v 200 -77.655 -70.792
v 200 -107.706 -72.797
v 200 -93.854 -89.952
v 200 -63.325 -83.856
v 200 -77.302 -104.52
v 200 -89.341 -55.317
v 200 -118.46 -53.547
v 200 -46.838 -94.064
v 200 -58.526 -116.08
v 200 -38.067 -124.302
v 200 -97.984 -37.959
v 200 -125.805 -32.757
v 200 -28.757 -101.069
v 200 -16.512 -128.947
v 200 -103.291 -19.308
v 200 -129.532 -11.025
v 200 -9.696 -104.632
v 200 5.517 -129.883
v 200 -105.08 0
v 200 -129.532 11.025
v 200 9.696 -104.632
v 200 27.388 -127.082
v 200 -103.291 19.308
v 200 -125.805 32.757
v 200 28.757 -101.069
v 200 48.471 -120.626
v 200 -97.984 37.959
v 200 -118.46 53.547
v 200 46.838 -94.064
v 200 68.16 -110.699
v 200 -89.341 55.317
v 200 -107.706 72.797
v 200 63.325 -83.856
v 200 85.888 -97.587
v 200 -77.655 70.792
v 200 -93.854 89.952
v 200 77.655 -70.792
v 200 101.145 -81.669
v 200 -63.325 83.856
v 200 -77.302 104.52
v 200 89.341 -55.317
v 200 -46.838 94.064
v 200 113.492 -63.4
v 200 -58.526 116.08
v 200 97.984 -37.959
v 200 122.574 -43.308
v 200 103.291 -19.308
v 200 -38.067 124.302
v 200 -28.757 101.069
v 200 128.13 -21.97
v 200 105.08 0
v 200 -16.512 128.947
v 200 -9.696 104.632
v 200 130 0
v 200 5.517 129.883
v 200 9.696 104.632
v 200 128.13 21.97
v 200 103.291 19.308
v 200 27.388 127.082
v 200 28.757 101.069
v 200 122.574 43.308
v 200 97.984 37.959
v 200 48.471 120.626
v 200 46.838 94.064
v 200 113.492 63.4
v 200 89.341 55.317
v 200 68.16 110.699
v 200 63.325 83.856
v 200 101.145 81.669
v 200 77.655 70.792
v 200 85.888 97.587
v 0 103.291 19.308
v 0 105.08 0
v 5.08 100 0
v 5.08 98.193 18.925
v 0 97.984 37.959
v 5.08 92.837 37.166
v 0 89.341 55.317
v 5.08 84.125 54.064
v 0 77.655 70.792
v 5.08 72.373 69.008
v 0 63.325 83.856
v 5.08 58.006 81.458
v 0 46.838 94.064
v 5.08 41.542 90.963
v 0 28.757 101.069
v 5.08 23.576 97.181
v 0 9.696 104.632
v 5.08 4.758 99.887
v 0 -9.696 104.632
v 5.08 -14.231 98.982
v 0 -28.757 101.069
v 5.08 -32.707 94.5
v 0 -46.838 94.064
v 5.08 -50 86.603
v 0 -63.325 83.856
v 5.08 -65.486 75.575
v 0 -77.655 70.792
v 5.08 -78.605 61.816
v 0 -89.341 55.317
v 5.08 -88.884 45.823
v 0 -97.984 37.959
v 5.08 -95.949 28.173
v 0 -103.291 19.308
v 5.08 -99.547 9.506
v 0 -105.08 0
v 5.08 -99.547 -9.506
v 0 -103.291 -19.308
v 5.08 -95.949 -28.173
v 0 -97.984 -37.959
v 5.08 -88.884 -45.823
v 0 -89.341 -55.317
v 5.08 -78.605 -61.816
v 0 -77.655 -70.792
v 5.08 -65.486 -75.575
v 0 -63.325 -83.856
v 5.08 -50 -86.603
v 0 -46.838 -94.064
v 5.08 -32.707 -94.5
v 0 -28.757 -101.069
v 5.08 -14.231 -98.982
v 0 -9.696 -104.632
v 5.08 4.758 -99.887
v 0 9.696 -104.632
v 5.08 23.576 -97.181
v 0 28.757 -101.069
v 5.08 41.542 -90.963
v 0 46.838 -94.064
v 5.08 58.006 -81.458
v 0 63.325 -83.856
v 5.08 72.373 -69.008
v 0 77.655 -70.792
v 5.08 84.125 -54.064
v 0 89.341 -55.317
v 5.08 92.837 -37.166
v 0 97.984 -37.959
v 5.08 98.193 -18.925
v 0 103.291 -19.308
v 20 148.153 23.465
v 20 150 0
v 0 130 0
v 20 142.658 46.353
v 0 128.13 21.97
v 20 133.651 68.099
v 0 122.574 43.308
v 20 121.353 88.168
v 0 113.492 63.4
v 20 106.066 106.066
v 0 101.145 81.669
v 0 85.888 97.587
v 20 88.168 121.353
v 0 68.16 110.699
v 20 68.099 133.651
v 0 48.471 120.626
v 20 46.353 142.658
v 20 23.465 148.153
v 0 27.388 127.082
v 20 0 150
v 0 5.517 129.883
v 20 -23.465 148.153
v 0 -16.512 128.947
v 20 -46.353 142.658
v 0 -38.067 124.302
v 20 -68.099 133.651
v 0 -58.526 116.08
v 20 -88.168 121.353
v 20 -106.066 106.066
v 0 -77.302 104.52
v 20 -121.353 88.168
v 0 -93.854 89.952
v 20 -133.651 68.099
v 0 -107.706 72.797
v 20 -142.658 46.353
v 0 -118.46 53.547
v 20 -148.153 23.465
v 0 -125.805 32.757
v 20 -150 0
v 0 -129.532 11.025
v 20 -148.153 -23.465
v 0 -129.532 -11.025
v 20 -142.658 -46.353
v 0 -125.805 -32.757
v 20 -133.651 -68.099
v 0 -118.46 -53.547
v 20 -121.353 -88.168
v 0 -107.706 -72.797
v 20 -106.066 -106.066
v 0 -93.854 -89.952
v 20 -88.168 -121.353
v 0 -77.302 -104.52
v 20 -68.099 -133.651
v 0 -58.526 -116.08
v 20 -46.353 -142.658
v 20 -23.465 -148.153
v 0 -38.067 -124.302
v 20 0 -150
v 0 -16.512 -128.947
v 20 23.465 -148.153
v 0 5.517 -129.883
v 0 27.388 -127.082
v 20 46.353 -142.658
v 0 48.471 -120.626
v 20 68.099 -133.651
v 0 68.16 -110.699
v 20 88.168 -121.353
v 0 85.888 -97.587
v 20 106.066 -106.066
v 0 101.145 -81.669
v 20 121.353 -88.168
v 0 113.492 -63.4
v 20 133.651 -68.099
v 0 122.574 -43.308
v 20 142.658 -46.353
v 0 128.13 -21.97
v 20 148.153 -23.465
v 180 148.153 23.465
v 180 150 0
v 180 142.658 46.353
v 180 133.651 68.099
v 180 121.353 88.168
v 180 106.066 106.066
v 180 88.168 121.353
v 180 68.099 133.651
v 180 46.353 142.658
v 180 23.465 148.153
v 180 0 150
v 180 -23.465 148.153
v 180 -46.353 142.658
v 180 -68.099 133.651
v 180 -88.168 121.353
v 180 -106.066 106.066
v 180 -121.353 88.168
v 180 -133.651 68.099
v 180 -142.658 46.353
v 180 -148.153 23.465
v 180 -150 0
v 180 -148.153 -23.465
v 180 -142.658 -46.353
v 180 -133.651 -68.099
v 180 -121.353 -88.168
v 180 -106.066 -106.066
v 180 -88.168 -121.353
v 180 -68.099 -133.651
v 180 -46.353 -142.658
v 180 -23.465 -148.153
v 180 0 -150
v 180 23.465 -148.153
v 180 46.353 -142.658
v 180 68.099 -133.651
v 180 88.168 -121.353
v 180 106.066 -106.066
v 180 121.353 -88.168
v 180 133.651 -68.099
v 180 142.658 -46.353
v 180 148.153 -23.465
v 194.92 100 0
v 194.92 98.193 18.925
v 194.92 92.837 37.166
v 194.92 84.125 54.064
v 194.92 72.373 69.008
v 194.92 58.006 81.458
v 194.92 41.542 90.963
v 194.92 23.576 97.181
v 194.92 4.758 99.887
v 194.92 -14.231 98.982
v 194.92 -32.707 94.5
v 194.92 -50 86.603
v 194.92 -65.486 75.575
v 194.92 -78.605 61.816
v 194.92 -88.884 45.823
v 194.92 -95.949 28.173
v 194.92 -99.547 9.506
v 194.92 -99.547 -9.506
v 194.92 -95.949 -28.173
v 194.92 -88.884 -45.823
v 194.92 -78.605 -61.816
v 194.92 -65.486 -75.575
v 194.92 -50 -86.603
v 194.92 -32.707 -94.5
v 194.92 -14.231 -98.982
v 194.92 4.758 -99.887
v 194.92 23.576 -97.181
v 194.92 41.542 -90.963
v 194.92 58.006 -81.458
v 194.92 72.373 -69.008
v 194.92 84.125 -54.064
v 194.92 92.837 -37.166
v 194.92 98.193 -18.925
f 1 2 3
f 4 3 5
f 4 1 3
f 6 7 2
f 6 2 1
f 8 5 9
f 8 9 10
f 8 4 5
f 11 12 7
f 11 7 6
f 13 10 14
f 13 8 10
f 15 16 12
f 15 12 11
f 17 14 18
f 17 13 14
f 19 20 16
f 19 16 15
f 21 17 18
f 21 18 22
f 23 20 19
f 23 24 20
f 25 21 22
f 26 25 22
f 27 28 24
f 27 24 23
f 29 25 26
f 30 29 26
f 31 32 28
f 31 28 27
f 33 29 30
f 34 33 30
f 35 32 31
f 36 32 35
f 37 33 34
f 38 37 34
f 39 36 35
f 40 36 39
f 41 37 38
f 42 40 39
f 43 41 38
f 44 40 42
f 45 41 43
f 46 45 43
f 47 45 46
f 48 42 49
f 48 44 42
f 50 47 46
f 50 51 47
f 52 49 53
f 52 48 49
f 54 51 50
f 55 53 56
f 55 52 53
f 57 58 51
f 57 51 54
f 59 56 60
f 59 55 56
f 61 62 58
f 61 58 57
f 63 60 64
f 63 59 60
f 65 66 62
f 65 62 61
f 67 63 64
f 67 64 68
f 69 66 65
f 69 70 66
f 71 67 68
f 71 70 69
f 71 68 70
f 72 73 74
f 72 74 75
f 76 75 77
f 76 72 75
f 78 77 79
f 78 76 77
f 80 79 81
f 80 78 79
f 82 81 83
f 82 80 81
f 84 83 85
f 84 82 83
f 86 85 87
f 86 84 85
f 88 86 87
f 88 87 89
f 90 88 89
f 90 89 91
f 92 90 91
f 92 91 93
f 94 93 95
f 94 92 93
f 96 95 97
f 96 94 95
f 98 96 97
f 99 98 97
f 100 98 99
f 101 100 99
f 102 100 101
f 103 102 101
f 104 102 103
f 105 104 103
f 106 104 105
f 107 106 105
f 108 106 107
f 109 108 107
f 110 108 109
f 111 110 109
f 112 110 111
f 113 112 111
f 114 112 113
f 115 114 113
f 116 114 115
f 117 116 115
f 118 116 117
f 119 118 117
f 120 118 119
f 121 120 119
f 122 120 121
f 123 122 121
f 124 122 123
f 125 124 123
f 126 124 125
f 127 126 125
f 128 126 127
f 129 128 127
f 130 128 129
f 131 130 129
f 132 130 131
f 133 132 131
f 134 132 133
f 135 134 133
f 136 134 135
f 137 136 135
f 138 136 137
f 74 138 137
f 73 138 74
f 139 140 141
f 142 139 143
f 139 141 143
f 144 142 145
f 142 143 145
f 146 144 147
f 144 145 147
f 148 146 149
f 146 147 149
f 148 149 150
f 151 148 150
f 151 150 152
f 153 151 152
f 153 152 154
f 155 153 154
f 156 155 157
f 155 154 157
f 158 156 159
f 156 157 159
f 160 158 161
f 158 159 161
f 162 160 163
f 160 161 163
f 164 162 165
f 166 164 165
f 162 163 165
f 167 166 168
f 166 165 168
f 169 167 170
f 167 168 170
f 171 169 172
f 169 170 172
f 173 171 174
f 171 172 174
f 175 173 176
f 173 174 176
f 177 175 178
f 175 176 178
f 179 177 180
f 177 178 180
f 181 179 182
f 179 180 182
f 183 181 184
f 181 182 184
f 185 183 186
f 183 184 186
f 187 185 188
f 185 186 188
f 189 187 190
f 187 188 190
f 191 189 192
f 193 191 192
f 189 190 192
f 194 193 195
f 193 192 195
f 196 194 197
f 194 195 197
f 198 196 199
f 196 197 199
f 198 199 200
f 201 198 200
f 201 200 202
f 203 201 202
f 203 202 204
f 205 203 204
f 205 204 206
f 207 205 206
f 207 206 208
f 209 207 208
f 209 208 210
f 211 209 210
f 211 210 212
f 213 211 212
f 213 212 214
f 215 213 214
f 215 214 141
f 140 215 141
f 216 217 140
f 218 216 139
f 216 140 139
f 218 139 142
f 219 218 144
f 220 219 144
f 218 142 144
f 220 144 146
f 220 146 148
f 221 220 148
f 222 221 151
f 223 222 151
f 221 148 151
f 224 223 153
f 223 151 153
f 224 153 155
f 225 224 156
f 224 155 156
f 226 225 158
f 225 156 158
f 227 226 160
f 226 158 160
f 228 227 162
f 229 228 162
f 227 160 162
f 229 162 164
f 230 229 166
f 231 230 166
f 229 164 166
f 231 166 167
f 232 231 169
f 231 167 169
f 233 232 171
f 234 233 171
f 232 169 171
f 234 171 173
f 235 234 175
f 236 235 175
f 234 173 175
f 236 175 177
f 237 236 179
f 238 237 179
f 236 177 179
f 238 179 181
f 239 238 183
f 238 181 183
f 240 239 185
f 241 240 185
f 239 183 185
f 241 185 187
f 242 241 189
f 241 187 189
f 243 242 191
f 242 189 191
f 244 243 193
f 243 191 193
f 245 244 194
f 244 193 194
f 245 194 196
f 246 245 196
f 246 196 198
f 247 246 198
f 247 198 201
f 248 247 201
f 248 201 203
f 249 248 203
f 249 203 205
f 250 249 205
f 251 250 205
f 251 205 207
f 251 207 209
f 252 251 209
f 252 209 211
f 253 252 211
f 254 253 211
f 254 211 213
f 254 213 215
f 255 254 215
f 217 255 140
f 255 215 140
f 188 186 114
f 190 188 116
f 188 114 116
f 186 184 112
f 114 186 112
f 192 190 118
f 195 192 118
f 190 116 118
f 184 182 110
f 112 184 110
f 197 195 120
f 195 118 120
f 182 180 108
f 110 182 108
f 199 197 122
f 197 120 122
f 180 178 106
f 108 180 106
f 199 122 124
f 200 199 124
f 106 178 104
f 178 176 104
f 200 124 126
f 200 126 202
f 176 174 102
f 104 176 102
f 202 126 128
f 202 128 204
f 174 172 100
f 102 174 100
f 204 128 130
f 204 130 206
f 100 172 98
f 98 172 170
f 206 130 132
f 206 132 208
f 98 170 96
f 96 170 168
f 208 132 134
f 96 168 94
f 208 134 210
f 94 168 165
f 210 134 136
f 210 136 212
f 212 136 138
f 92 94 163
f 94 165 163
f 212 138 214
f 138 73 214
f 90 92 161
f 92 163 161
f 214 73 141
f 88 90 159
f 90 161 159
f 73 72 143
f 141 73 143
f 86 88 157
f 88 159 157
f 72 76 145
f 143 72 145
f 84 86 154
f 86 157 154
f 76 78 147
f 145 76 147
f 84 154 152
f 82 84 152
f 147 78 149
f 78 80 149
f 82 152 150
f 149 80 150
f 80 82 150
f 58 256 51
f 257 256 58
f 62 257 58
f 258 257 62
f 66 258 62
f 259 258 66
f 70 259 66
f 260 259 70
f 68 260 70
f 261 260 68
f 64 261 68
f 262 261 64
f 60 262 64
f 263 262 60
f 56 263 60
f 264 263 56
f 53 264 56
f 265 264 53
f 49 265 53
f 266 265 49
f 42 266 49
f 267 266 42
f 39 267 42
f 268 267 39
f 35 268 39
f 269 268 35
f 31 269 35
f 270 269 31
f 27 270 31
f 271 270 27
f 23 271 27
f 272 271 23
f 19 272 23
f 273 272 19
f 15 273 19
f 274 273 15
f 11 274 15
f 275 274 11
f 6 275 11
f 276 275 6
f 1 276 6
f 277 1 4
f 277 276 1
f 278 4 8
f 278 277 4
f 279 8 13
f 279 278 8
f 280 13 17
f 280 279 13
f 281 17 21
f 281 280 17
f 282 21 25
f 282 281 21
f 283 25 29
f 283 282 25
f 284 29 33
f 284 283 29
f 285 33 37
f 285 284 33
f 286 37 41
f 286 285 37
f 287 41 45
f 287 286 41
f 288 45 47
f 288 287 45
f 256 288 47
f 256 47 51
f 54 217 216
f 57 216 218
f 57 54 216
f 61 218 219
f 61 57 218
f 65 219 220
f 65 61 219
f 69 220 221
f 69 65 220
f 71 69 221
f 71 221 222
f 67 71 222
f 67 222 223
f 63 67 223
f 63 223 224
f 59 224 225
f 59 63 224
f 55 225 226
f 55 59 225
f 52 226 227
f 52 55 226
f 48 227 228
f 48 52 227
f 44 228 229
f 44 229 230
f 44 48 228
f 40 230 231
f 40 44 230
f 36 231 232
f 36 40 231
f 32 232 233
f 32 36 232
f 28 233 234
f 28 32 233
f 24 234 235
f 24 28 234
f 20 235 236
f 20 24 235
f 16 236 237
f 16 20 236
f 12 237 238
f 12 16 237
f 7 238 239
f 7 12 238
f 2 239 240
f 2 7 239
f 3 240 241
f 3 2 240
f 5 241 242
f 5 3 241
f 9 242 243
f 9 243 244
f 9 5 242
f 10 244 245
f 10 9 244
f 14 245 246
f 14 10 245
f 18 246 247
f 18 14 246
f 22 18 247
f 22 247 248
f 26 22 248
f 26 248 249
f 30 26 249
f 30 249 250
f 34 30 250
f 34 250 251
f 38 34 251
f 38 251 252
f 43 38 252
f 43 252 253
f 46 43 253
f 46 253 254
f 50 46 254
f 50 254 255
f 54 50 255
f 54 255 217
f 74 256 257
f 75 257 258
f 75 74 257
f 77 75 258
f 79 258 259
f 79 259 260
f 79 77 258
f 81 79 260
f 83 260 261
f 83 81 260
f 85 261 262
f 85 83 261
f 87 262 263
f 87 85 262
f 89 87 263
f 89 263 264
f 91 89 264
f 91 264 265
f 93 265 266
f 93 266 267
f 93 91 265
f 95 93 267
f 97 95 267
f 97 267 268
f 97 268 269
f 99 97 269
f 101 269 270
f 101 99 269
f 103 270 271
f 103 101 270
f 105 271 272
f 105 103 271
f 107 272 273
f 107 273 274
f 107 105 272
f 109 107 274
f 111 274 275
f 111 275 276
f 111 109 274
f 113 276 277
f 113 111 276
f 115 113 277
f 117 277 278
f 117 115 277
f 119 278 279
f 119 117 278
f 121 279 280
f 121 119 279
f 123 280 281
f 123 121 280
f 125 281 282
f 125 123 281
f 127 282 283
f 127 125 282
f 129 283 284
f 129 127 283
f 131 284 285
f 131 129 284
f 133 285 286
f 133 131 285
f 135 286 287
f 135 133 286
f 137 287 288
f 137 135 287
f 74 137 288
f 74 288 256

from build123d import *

# Parameters (mm, degrees)
F0_R     = 150
F0_R_2   = 100
F1_DEPTH = 200
F2_SIZE  = 20
F3_SIZE  = 20
F4_SIZE  = 5.08
F5_SIZE  = 5.08


with BuildPart() as f1:
    # F0 (on Right) → F1 (new body)
    with BuildSketch(Plane.YZ):
        Circle(F0_R)
        Circle(F0_R_2, mode=Mode.SUBTRACT)
    extrude(amount=F1_DEPTH)

    # F2
    f2_edges = [f1.edges().sort_by_distance(p)[0] for p in [
        (200, -150, 0),
    ]]
    chamfer(f2_edges, length=F2_SIZE)

    # F3
    f3_edges = [f1.edges().sort_by_distance(p)[0] for p in [
        (0, -150, 0),
    ]]
    chamfer(f3_edges, length=F3_SIZE)

    # F4
    f4_edges = [f1.edges().sort_by_distance(p)[0] for p in [
        (200, -100, 0),
    ]]
    chamfer(f4_edges, length=F4_SIZE)

    # F5
    f5_edges = [f1.edges().sort_by_distance(p)[0] for p in [
        (0, -100, 0),
    ]]
    chamfer(f5_edges, length=F5_SIZE)


solid = f1.part
